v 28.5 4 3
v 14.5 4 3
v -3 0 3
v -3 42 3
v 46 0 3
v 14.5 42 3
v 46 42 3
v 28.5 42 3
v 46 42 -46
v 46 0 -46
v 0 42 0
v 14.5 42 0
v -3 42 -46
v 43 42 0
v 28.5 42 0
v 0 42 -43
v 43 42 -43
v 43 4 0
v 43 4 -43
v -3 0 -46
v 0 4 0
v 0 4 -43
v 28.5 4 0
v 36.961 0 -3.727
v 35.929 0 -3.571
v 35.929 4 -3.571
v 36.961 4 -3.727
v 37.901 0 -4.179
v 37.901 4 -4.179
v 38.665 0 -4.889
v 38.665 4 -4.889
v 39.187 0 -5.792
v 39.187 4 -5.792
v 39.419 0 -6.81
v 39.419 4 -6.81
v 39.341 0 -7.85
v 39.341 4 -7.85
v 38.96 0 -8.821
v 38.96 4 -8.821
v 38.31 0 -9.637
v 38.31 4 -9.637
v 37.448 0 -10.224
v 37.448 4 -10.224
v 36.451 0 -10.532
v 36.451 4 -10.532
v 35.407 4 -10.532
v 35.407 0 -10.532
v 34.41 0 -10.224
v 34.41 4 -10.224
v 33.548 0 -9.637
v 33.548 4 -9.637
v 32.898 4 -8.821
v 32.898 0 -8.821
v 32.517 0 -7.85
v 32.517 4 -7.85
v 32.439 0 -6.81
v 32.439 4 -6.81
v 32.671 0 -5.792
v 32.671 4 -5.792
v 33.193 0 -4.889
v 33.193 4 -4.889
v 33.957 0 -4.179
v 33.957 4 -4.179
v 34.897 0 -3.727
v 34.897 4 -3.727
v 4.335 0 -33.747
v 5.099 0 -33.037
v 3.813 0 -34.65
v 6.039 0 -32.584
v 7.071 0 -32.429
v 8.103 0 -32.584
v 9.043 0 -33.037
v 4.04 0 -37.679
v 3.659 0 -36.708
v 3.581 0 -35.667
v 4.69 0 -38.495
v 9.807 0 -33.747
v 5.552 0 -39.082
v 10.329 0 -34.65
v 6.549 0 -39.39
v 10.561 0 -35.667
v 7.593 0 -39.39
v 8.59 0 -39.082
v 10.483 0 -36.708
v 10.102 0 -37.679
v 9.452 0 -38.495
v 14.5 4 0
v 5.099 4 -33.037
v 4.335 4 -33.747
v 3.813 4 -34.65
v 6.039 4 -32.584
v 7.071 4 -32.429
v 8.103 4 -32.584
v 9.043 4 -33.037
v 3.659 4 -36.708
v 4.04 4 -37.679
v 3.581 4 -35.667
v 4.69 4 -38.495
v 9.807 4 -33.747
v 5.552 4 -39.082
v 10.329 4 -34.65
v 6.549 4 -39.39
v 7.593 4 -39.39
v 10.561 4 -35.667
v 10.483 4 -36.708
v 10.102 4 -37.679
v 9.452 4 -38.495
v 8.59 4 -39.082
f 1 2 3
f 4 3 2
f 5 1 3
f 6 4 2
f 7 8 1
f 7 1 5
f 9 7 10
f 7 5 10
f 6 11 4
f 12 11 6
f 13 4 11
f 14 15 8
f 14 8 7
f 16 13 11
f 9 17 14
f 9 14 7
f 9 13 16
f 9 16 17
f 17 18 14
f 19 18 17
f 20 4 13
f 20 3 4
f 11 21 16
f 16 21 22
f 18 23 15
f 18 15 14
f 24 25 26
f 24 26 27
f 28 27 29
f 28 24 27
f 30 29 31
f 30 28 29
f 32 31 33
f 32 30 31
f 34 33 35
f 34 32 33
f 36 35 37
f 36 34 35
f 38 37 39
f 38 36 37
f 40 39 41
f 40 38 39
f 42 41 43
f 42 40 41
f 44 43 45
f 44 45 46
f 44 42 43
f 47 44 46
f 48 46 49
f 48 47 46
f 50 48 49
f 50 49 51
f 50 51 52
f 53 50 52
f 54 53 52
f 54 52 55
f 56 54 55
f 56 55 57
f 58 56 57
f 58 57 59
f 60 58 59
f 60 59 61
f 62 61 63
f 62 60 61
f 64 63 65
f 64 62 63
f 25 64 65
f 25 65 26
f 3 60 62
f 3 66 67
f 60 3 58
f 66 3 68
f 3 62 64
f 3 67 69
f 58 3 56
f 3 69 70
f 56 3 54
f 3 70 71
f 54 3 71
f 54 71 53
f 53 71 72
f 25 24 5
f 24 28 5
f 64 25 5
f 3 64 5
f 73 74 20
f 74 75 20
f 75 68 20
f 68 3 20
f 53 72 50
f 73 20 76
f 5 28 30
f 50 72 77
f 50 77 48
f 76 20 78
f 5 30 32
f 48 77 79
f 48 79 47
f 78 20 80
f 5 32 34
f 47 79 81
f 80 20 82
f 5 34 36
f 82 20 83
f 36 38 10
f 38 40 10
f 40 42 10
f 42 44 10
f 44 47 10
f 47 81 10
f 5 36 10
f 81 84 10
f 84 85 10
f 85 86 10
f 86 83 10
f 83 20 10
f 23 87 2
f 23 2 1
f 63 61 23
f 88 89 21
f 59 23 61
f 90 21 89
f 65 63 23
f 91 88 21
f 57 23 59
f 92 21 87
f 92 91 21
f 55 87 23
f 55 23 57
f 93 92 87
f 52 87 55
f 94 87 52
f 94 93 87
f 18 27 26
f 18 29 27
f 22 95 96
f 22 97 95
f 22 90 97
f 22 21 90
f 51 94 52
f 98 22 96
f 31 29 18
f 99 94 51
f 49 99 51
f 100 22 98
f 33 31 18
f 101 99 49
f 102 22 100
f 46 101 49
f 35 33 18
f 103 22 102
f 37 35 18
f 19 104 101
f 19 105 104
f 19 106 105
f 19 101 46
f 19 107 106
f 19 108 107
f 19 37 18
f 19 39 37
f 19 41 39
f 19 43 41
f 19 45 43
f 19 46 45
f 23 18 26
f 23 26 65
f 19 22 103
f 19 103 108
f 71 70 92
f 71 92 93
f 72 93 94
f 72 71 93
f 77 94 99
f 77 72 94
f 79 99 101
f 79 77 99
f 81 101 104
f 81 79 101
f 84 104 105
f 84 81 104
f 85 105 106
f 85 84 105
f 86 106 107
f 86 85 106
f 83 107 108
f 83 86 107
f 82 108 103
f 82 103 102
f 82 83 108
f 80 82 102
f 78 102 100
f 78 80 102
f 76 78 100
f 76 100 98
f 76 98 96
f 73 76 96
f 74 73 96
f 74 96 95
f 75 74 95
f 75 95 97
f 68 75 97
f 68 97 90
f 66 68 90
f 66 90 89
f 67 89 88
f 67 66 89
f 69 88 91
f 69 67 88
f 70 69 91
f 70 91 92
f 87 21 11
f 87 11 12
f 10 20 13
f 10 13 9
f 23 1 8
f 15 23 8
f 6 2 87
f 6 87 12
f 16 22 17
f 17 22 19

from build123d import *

# Parameters (mm, degrees)
ESQUISSE1_W             = 49
ESQUISSE1_H             = 49
ESQUISSE1_W_2           = 43
ESQUISSE1_H_2           = 43
ESQUISSE1_R             = 3.5
BOSS_EXTRU_1_DEPTH      = 4
ESQUISSE2_W             = 49
ESQUISSE2_H             = 49
ESQUISSE2_W_2           = 43
ESQUISSE2_H_2           = 43
BOSS_EXTRU_2_DEPTH      = 38
ESQUISSE3_W             = 14
ESQUISSE3_H             = 42
ENL_V_MAT_EXTRU_1_DEPTH = 3
ESQUISSE4_W             = 14
ESQUISSE4_H             = 4
BOSS_EXTRU_3_DEPTH      = 3


with BuildPart() as part:
    # Esquisse1 → Boss.-Extru.1 (new body)
    with BuildSketch(Plane(origin=(0, 0, 0), x_dir=(1, 0, 0), z_dir=(0, 1, 0))):
        with Locations((21.5, 21.5)):
            Rectangle(ESQUISSE1_W, ESQUISSE1_H)
        with Locations((21.5, 21.5)):
            Rectangle(ESQUISSE1_W_2, ESQUISSE1_H_2, mode=Mode.SUBTRACT)
        with Locations((21.5, 21.5)):
            Rectangle(ESQUISSE1_W_2, ESQUISSE1_H_2)
        with Locations(Location((35.928932188, 7.071067812, 0), (0, 0, 270))):
            Circle(ESQUISSE1_R, mode=Mode.SUBTRACT)
        with Locations(Location((7.071067812, 35.928932188, 0), (0, 0, 270))):
            Circle(ESQUISSE1_R, mode=Mode.SUBTRACT)
    extrude(amount=BOSS_EXTRU_1_DEPTH)

    # Esquisse2 → Boss.-Extru.2 (add)
    with BuildSketch(Plane(origin=(0, 4, 0), x_dir=(1, 0, 0), z_dir=(0, 1, 0))):
        with Locations((21.5, 21.5)):
            Rectangle(ESQUISSE2_W, ESQUISSE2_H)
        with Locations((21.5, 21.5)):
            Rectangle(ESQUISSE2_W_2, ESQUISSE2_H_2, mode=Mode.SUBTRACT)
    extrude(amount=BOSS_EXTRU_2_DEPTH)

    # Esquisse3 → Enlèv. mat.-Extru.1 (cut)
    with BuildSketch(Plane.XY.offset(3)):
        with Locations((21.5, 21)):
            Rectangle(ESQUISSE3_W, ESQUISSE3_H)
    extrude(amount=-ENL_V_MAT_EXTRU_1_DEPTH, mode=Mode.SUBTRACT)

    # Esquisse4 → Boss.-Extru.3 (add)
    with BuildSketch(Plane.XY):
        with Locations((21.5, 2)):
            Rectangle(ESQUISSE4_W, ESQUISSE4_H)
    extrude(amount=BOSS_EXTRU_3_DEPTH)


solid = part.part
